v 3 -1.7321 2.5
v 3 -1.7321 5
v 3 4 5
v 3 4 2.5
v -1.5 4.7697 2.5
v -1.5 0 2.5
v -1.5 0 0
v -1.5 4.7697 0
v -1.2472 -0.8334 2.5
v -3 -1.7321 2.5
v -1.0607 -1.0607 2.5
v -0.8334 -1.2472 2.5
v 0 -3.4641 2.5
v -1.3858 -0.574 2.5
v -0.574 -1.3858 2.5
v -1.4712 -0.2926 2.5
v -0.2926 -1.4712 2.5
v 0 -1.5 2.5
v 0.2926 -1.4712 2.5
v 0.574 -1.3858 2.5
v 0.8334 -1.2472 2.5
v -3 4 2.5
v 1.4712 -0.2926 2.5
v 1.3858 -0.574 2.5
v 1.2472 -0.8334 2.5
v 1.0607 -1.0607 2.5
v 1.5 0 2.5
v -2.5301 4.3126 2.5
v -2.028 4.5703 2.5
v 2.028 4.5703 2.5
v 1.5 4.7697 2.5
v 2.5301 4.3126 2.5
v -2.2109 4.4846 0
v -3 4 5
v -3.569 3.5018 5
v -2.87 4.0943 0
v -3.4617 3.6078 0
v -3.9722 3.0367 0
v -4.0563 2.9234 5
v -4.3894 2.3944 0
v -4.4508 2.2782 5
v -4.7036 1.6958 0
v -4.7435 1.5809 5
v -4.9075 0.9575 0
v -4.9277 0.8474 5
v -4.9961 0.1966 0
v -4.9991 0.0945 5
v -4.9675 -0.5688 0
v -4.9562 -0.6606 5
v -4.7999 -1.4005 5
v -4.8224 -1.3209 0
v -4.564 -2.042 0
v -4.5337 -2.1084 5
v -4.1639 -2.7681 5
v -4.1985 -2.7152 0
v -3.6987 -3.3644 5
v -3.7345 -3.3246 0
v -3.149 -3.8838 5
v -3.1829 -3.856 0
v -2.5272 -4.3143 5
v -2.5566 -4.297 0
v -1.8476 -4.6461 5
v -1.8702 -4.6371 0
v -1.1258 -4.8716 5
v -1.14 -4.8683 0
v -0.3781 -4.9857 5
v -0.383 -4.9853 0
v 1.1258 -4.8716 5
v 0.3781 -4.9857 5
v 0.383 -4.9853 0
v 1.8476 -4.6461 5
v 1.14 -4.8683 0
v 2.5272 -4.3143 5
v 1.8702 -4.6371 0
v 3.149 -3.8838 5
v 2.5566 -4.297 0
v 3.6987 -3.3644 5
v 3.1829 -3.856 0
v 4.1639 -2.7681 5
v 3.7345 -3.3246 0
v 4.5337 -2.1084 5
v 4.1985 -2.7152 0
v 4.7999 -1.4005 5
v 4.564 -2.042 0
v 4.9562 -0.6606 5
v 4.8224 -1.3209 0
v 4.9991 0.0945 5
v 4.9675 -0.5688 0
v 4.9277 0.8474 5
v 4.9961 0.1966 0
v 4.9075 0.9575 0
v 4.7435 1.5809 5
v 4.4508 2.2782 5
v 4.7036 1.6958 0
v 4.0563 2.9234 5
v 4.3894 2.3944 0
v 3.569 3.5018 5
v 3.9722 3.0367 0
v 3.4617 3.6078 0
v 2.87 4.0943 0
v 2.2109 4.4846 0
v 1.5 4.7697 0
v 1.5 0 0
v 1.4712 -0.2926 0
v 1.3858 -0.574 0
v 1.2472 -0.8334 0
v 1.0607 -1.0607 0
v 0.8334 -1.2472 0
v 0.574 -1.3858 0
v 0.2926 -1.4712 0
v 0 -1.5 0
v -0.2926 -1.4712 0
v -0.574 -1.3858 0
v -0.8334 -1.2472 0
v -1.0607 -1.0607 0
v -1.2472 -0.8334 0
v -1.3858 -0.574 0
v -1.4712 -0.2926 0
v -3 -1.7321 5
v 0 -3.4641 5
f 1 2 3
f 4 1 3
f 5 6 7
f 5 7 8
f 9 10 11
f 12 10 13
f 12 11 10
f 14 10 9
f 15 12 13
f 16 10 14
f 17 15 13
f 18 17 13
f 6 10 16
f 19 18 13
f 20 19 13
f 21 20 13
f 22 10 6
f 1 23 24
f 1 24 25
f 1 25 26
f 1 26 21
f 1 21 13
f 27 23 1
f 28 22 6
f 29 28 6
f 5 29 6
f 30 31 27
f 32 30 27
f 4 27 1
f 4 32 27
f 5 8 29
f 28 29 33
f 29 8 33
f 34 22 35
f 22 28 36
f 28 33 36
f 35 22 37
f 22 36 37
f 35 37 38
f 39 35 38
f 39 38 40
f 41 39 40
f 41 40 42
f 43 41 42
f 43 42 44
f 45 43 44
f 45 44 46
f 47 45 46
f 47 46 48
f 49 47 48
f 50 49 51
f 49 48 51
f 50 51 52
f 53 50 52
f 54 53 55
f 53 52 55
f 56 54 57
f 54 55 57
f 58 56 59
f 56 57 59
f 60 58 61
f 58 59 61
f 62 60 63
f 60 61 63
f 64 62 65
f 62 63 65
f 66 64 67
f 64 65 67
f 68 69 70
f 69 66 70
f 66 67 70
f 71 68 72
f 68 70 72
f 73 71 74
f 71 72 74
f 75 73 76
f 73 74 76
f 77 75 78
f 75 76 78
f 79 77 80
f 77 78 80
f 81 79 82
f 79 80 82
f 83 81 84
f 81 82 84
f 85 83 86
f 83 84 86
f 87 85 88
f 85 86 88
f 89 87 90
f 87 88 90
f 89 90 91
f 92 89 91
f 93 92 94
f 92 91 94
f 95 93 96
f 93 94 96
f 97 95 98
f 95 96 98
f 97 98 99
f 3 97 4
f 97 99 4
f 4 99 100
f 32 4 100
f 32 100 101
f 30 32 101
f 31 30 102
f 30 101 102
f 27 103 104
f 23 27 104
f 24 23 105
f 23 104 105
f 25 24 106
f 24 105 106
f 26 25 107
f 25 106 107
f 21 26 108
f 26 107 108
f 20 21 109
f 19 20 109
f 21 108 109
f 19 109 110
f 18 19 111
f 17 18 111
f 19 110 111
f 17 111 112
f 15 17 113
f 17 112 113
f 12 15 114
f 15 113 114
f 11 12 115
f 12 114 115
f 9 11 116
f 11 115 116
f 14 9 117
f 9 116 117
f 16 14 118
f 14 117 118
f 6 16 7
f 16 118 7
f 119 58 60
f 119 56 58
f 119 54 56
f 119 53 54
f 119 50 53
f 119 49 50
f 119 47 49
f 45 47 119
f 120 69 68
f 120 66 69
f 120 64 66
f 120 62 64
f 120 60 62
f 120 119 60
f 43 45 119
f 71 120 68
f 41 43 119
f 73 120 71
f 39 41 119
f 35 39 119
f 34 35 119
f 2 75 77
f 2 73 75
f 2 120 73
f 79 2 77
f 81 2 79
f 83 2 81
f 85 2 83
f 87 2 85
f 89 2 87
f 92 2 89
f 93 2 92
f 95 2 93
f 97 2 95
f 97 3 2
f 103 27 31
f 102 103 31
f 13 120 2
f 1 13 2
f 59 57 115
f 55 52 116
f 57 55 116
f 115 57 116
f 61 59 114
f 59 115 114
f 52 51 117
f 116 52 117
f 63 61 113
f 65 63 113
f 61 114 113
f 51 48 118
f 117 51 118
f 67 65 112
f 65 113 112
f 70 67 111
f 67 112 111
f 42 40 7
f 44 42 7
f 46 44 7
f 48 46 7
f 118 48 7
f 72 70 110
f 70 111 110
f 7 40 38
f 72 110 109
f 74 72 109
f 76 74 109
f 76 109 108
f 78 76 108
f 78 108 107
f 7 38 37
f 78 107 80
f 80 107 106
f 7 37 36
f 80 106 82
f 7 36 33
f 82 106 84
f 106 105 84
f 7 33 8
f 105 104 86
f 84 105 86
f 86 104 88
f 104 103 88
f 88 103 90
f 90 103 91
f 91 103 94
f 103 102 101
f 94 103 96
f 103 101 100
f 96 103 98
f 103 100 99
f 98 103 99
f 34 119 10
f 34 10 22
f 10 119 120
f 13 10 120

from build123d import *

# Parameters (mm, degrees)
SZKIC1_R                                 = 5
DODANIE_WYCI_GNI_CIE1_DEPTH              = 5
WYTNIJ_WYCI_GNI_CIE3_DEPTH               = 2.5
OTWORY_USTALAJ_CE_3_0MMCLEARANCE_1_D     = 3
OTWORY_USTALAJ_CE_3_0MMCLEARANCE_1_DEPTH = 7.25
OTWORY_USTALAJ_CE_3_0MMCLEARANCE_1_TIP   = 0.901290929
SZKIC19_W                                = 6
SZKIC19_H                                = 3.662813391
WYTNIJ_WYCI_GNI_CIE8_DEPTH               = 2.5
SZKIC20_W                                = 3
SZKIC20_H                                = 6.977009587
WYTNIJ_WYCI_GNI_CIE9_DEPTH               = 2.5


with BuildPart() as part:
    # Szkic1 → Dodanie-wyciągnięcie1 (new body)
    with BuildSketch(Plane.XY):
        Circle(SZKIC1_R)
    extrude(amount=DODANIE_WYCI_GNI_CIE1_DEPTH)

    # Szkic10 → Wytnij-wyciągnięcie3 (cut)
    with BuildSketch(Plane.XY.offset(5)):
        Polygon((0, 3.464101615), (-3, 1.732050808), (-3, -1.732050808), (0, -3.464101615), (3, -1.732050808), (3, 1.732050808), align=None)
    extrude(amount=-WYTNIJ_WYCI_GNI_CIE3_DEPTH, mode=Mode.SUBTRACT)

    # Otwory ustalające Ø3.0mmClearance 1
    with Locations(Plane.XY.offset(2.5)):
        with Locations((0, 0)):
            Hole(OTWORY_USTALAJ_CE_3_0MMCLEARANCE_1_D / 2, depth=OTWORY_USTALAJ_CE_3_0MMCLEARANCE_1_DEPTH)
            with Locations((0, 0, -(OTWORY_USTALAJ_CE_3_0MMCLEARANCE_1_DEPTH + OTWORY_USTALAJ_CE_3_0MMCLEARANCE_1_TIP / 2))):  # 118° drill point
                Cone(0, OTWORY_USTALAJ_CE_3_0MMCLEARANCE_1_D / 2, OTWORY_USTALAJ_CE_3_0MMCLEARANCE_1_TIP, mode=Mode.SUBTRACT)

    # Szkic19 → Wytnij-wyciągnięcie8 (cut)
    with BuildSketch(Plane.XY.offset(5)):
        with Locations((0, 3.563457504)):
            Rectangle(SZKIC19_W, SZKIC19_H)
    extrude(amount=-WYTNIJ_WYCI_GNI_CIE8_DEPTH, mode=Mode.SUBTRACT)

    # Szkic20 → Wytnij-wyciągnięcie9 (cut)
    with BuildSketch(Plane.XY.offset(2.5)):
        with Locations((0, 3.488504794)):
            Rectangle(SZKIC20_W, SZKIC20_H)
    extrude(amount=-WYTNIJ_WYCI_GNI_CIE9_DEPTH, mode=Mode.SUBTRACT)


solid = part.part
